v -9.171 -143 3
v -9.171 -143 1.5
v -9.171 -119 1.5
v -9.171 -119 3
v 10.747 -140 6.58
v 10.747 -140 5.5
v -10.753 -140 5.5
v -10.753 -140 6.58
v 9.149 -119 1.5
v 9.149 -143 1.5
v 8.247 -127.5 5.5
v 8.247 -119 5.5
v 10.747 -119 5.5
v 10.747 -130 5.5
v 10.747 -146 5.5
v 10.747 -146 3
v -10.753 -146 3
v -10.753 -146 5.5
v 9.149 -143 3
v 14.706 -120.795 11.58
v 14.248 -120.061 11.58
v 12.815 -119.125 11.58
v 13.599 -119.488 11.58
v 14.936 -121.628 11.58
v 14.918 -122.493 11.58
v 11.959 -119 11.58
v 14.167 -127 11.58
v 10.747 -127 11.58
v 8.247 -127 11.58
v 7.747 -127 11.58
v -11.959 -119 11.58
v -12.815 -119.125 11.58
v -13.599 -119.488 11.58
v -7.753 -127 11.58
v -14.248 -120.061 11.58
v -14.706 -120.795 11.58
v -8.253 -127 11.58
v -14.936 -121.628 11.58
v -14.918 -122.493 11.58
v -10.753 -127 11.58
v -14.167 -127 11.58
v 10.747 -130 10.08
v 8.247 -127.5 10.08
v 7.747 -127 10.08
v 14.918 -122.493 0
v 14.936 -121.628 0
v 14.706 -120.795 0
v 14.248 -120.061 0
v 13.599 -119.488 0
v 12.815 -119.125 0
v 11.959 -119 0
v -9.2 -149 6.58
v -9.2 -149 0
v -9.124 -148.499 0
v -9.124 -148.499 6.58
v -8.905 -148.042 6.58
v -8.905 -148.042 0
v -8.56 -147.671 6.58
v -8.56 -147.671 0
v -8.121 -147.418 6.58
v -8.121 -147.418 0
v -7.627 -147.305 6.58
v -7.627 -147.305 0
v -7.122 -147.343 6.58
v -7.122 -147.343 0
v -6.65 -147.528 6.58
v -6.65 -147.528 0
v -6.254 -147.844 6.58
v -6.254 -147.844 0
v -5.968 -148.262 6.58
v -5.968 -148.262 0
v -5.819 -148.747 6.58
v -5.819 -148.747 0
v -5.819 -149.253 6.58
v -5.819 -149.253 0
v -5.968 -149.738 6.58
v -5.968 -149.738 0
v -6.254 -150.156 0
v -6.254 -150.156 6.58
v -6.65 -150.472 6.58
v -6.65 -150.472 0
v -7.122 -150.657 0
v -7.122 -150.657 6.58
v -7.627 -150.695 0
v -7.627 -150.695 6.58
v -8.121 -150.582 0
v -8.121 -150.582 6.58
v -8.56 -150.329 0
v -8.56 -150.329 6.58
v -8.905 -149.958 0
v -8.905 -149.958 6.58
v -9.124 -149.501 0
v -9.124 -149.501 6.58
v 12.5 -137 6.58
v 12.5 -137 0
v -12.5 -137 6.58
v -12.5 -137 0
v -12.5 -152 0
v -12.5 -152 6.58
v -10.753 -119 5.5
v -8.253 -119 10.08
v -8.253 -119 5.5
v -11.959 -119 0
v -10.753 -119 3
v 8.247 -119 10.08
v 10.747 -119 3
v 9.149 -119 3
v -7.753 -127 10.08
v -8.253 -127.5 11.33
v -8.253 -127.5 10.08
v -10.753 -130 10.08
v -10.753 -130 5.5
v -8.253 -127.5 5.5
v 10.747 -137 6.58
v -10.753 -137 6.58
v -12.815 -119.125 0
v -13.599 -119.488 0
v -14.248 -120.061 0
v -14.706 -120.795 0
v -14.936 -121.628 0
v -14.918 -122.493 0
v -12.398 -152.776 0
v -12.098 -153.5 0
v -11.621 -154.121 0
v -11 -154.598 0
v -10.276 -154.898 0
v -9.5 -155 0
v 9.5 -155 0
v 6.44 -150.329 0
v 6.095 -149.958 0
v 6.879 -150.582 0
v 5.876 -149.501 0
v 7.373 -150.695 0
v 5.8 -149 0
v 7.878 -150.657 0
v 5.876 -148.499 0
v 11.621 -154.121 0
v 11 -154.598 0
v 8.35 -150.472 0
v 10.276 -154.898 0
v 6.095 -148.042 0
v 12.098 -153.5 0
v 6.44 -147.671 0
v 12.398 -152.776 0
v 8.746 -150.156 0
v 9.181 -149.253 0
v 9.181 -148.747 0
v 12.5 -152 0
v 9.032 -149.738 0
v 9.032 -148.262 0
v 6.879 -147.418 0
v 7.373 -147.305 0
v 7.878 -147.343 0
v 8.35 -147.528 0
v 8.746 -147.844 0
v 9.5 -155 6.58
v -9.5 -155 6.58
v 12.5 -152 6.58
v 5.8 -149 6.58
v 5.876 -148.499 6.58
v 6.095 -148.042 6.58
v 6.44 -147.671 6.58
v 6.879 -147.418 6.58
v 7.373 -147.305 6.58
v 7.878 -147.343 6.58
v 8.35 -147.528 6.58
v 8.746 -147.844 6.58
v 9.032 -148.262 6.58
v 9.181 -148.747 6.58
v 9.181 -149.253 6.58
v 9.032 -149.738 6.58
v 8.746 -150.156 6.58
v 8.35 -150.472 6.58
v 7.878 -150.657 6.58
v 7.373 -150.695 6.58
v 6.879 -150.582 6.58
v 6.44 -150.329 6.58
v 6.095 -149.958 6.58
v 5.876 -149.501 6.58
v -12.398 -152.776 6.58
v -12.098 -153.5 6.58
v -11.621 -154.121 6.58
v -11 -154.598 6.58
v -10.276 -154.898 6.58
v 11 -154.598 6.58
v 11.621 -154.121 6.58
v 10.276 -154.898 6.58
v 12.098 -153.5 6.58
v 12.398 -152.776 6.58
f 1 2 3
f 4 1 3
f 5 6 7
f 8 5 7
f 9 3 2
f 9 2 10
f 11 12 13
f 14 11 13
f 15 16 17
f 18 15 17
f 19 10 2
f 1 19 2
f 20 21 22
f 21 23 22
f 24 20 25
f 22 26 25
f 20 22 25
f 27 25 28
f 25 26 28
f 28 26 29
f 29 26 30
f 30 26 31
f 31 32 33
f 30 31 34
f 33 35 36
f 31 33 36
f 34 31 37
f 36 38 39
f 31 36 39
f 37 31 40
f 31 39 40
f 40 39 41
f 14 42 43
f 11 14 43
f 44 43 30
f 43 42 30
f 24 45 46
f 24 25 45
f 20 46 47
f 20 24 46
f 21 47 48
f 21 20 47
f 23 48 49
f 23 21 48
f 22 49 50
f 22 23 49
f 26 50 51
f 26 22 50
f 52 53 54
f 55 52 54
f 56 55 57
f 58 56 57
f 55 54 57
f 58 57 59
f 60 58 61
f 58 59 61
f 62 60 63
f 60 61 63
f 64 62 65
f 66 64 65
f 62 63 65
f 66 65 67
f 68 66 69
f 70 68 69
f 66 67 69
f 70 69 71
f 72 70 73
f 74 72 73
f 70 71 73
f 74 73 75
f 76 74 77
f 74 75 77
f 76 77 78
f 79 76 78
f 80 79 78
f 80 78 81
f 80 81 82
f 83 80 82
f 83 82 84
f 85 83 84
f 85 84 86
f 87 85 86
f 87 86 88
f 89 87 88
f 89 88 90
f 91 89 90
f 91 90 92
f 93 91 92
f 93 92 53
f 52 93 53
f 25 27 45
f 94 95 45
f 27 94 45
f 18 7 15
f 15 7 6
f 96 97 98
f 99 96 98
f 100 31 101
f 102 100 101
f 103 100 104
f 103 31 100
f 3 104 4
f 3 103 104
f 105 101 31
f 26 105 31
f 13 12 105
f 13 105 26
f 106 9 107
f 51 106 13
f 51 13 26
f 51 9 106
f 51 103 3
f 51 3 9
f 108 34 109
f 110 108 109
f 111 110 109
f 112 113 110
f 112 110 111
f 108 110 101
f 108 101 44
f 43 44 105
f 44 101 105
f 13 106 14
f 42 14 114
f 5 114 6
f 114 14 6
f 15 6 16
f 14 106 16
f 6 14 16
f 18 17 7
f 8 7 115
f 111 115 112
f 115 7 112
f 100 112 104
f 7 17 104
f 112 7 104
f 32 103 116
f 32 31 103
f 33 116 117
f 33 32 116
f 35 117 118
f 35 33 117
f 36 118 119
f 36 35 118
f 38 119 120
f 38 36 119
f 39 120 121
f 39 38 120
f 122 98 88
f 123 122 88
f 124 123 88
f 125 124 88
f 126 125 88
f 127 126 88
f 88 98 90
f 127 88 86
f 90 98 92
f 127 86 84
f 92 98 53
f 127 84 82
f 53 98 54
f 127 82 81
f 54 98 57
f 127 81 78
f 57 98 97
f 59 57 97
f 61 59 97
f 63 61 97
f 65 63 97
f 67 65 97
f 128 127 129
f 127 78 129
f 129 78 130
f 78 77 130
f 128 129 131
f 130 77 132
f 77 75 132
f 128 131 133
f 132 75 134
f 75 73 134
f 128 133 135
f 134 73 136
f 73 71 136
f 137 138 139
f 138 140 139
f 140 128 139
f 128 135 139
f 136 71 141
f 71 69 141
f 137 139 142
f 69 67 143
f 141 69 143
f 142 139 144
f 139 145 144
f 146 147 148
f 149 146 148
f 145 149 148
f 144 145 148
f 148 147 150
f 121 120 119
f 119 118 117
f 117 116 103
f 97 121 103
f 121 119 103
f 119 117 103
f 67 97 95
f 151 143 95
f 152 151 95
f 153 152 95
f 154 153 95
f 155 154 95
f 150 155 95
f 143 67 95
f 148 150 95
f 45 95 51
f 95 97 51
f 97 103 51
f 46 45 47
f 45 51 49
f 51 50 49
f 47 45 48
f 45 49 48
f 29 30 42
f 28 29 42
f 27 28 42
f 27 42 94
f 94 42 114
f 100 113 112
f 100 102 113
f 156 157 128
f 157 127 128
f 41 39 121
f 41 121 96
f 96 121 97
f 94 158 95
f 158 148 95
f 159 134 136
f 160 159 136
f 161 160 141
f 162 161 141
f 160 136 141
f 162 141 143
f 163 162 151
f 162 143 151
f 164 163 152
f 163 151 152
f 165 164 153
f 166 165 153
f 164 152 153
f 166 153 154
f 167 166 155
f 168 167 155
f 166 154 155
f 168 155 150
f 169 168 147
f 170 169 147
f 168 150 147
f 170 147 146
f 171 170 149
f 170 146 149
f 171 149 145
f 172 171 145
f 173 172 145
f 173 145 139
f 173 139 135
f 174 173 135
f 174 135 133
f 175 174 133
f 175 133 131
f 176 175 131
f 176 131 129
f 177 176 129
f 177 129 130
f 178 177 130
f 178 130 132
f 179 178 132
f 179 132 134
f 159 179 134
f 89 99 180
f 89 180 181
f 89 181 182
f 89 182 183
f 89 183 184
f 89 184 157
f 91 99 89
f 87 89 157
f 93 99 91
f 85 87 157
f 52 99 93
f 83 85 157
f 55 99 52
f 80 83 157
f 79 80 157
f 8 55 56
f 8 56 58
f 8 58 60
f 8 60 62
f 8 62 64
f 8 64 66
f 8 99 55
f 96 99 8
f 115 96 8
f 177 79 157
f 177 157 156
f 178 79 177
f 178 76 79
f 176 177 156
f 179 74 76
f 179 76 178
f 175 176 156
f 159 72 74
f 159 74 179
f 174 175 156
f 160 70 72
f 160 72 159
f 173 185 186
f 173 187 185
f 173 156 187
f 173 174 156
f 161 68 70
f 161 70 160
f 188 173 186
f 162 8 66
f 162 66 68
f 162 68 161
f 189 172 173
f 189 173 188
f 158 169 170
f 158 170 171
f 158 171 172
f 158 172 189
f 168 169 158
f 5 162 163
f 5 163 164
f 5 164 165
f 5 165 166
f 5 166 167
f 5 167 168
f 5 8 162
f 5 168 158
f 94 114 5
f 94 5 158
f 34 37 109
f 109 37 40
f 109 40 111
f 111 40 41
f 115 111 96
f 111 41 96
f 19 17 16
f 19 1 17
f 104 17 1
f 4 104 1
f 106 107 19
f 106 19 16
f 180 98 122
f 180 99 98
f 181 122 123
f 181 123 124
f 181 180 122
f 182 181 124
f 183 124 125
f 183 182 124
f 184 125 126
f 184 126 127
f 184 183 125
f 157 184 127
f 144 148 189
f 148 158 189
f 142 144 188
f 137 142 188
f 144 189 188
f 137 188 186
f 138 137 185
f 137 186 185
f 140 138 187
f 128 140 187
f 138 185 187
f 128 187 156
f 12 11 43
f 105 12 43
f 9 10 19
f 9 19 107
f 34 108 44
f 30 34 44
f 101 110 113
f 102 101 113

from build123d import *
from OCP.BRepFilletAPI import BRepFilletAPI_MakeChamfer

# Parameters (mm, degrees)
ESQUISSE2_W             = 25
ESQUISSE2_H             = 36
BOSS_EXTRU_1_DEPTH      = 1.5
ESQUISSE3_W             = 3.350614404
ESQUISSE3_H             = 24
ESQUISSE3_W_2           = 3.329385596
BOSS_EXTRU_2_DEPTH      = 1.5
BOSS_EXTRU_3_DEPTH      = 8.58
BOSS_EXTRU_3_DEPTH_BACK = 3
BOSS_EXTRU_4_START      = 2.5
ESQUISSE5_W             = 18.32
ESQUISSE5_H             = 3
BOSS_EXTRU_4_DEPTH      = 6.08
ESQUISSE6_W             = 16.5
ESQUISSE6_H             = 1.5
BOSS_EXTRU_5_DEPTH      = 8
ESQUISSE7_W             = 25
ESQUISSE7_H             = 18
ENL_V_MAT_EXTRU_1_DEPTH = 5
CHANFREIN1_SIZE         = 10
CHANFREIN1_SIZE_2       = 5
CHANFREIN3_SIZE         = 3
CONG_1_R                = 3
CONG_2_R                = 3
D_GAGEMENT_M31_D        = 3.4


# Some blends are built 0.0001 mm under size
with BuildPart() as part:
    # Esquisse2 → Boss.-Extru.1 (new body)
    with BuildSketch(Plane.XY):
        with Locations((0, -137)):
            Rectangle(ESQUISSE2_W, ESQUISSE2_H)
    extrude(amount=BOSS_EXTRU_1_DEPTH)

    # Esquisse3 → Boss.-Extru.2 (add)
    with BuildSketch(Plane.XY.offset(1.5)):
        with Locations((10.824692798, -131)):
            Rectangle(ESQUISSE3_W, ESQUISSE3_H)
        Polygon((-12.5, -143), (-12.5, -155), (12.5, -155), (12.5, -143), (9.149385596, -143), (-9.170614404, -143), align=None)
        with Locations((-10.835307202, -131)):
            Rectangle(ESQUISSE3_W_2, ESQUISSE3_H)
    extrude(amount=BOSS_EXTRU_2_DEPTH)

    # Esquisse4 → Boss.-Extru.3 (add, two sides: drawn at the far end of the back side and taken through both)
    with BuildSketch(Plane.XY.offset(3).offset(-BOSS_EXTRU_3_DEPTH_BACK)):
        Polygon((-12.5, -119), (-15.5, -119), (-12.5, -137), (-12.5, -155), (12.5, -155), (12.5, -137), (15.5, -119), (12.5, -119), (10.747346399, -119), (10.747346399, -146), (-10.752653601, -146), (-10.752653601, -119), align=None)
    extrude(amount=BOSS_EXTRU_3_DEPTH + BOSS_EXTRU_3_DEPTH_BACK)

    # Esquisse5 → Boss.-Extru.4 (add)
    with BuildSketch(Plane.XY.offset(3).offset(BOSS_EXTRU_4_START)):
        Polygon((-10.752653601, -140), (-10.752653601, -146), (10.747346399, -146), (10.747346399, -140), (9.149385596, -140), (9.149385596, -143), (-9.170614404, -143), (-9.170614404, -140), align=None)
        with Locations((-0.010614404, -141.5)):
            Rectangle(ESQUISSE5_W, ESQUISSE5_H)
    extrude(amount=BOSS_EXTRU_4_DEPTH)

    # Esquisse6 → Boss.-Extru.5 (add)
    with BuildSketch(Plane(origin=(0, -119, 0), x_dir=(1, 0, 0), z_dir=(0, 1, 0))):
        Polygon((8.247346399, -11.58), (10.747346399, -11.58), (10.747346399, -5.5), (8.247346399, -5.5), (8.247346399, -10.08), align=None)
        with Locations((-0.002653601, -10.83)):
            Rectangle(ESQUISSE6_W, ESQUISSE6_H)
        Polygon((-10.752653601, -11.58), (-8.252653601, -11.58), (-8.252653601, -10.08), (-8.252653601, -5.5), (-10.752653601, -5.5), align=None)
    extrude(amount=-BOSS_EXTRU_5_DEPTH)

    # Esquisse7 → Enlèv. mat.-Extru.1 (cut)
    with BuildSketch(Plane.XY.offset(11.58)):
        with Locations((0, -146)):
            Rectangle(ESQUISSE7_W, ESQUISSE7_H)
    extrude(amount=-ENL_V_MAT_EXTRU_1_DEPTH, mode=Mode.SUBTRACT)

    # Chanfrein1
    chanfrein1_edges_1 = [part.edges().sort_by_distance(p)[0] for p in [
        (11.6236732, -137, 11.58),
    ]]
    chanfrein1_side_1 = [part.faces().sort_by_distance(p)[0] for p in [
        (11.6236732, -136.9, 11.58),
    ]]
    chanfrein1_edges_2 = [part.edges().sort_by_distance(p)[0] for p in [
        (-11.6263268, -137, 11.58),
    ]]
    chanfrein1_side_2 = [part.faces().sort_by_distance(p)[0] for p in [
        (-11.6263268, -136.9, 11.58),
    ]]
    chanfrein1 = BRepFilletAPI_MakeChamfer(part.part.solid().wrapped)
    for e in chanfrein1_edges_1:
        chanfrein1.Add(CHANFREIN1_SIZE - 0.0001, CHANFREIN1_SIZE_2 - 0.0001, e.wrapped, chanfrein1_side_1[0].wrapped)
    for e in chanfrein1_edges_2:
        chanfrein1.Add(CHANFREIN1_SIZE - 0.0001, CHANFREIN1_SIZE_2 - 0.0001, e.wrapped, chanfrein1_side_2[0].wrapped)
    add(Compound.cast(chanfrein1.Shape()), mode=Mode.REPLACE)  # a hair under: the kernel refuses the full size

    # Chanfrein3
    # the kernel refuses this chamfer: 3 mm, written as the material it adds along each edge
    with BuildSketch(Plane(origin=(-10.752653601, -127, 5.5), x_dir=(0.9996219169112968, 0.027495876610586775, 0), z_dir=(0, 0, 1))) as chanfrein3_piece_1_section:
        Polygon((CHANFREIN3_SIZE * 0.999621916911, -CHANFREIN3_SIZE * 0.0274958766106), (-CHANFREIN3_SIZE * 0.0274958766106, -CHANFREIN3_SIZE * 0.999621916911), (0, 0), align=None)
    chanfrein3_piece_1 = extrude(amount=6.08, mode=Mode.PRIVATE)
    chanfrein3_piece_1 = split(chanfrein3_piece_1, bisect_by=Plane(origin=(-8.784858651, -128.928894575, 10.615612357), z_dir=(0, 0.4472100177446834, -0.8944289798686087)), keep=Keep.TOP, mode=Mode.PRIVATE)
    chanfrein3_piece_1 = split(chanfrein3_piece_1, bisect_by=Plane(origin=(-8.252653601, -127.516102525, 7.79), z_dir=(-1, 0, 0)), keep=Keep.TOP, mode=Mode.PRIVATE)
    add(chanfrein3_piece_1)
    with BuildSketch(Plane(origin=(-10.752653601, -127, -2.215048964), x_dir=(0.9996219169112968, 0.027495876610586775, 0), z_dir=(0, 0, 1))) as chanfrein3_piece_2_section:
        Polygon((CHANFREIN3_SIZE * 0.999621916911, -CHANFREIN3_SIZE * 0.0274958766106), (-CHANFREIN3_SIZE * 0.0274958766106, -CHANFREIN3_SIZE * 0.999621916911), (0, 0), align=None)
    chanfrein3_piece_2 = extrude(amount=13.795048964, mode=Mode.PRIVATE)
    chanfrein3_piece_2 = split(chanfrein3_piece_2, bisect_by=Plane(origin=(-8.083536067, -127.445596899, 11.357253778), z_dir=(0, 0.4472100177446834, -0.8944289798686087)), keep=Keep.TOP, mode=Mode.PRIVATE)
    chanfrein3_piece_2 = split(chanfrein3_piece_2, bisect_by=Plane(origin=(-8.083536067, -127.161764932, 10.08), z_dir=(0, 0, 1)), keep=Keep.TOP, mode=Mode.PRIVATE)
    add(chanfrein3_piece_2)
    with BuildSketch(Plane(origin=(10.747346399, -127, 11.58), x_dir=(0.027495876610588044, -0.9996219169112968, 0), z_dir=(0, 0, -1))) as chanfrein3_piece_3_section:
        Polygon((CHANFREIN3_SIZE * 0.999621916911, CHANFREIN3_SIZE * 0.0274958766106), (-CHANFREIN3_SIZE * 0.0274958766106, CHANFREIN3_SIZE * 0.999621916911), (0, 0), align=None)
    chanfrein3_piece_3 = extrude(amount=6.08, mode=Mode.PRIVATE)
    chanfrein3_piece_3 = split(chanfrein3_piece_3, bisect_by=Plane(origin=(9.990097255, -128.087123339, 11.036493766), z_dir=(0, 0.4472100177446834, -0.8944289798686087)), keep=Keep.TOP, mode=Mode.PRIVATE)
    chanfrein3_piece_3 = split(chanfrein3_piece_3, bisect_by=Plane(origin=(8.247346399, -127.874570821, 10.61138448), z_dir=(1, 0, 0)), keep=Keep.TOP, mode=Mode.PRIVATE)
    add(chanfrein3_piece_3)
    with BuildSketch(Plane(origin=(10.747346399, -127, 11.58), x_dir=(0.027495876610588044, -0.9996219169112968, 0), z_dir=(0, 0, -1))) as chanfrein3_piece_4_section:
        Polygon((CHANFREIN3_SIZE * 0.999621916911, CHANFREIN3_SIZE * 0.0274958766106), (-CHANFREIN3_SIZE * 0.0274958766106, CHANFREIN3_SIZE * 0.999621916911), (0, 0), align=None)
    chanfrein3_piece_4 = extrude(amount=13.795048964, mode=Mode.PRIVATE)
    chanfrein3_piece_4 = split(chanfrein3_piece_4, bisect_by=Plane(origin=(8.078228865, -127.445596899, 11.357253778), z_dir=(0, 0.4472100177446834, -0.8944289798686087)), keep=Keep.TOP, mode=Mode.PRIVATE)
    chanfrein3_piece_4 = split(chanfrein3_piece_4, bisect_by=Plane(origin=(8.078228865, -127.161764932, 10.08), z_dir=(0, 0, 1)), keep=Keep.TOP, mode=Mode.PRIVATE)
    add(chanfrein3_piece_4)

    # Congé1
    cong_1_edges = [part.edges().sort_by_distance(p)[0] for p in [
        (-15.5, -119, 5.79),
        (15.5, -119, 5.79),
    ]]
    fillet(cong_1_edges, radius=CONG_1_R)

    # Congé2
    cong_2_edges = [part.edges().sort_by_distance(p)[0] for p in [
        (12.5, -155, 3.29),
        (-12.5, -155, 3.29),
    ]]
    fillet(cong_2_edges, radius=CONG_2_R)

    # Dégagement M31 (through all)
    with Locations(Plane.XY.offset(6.58)):
        with Locations((7.5, -149), (-7.5, -149)):
            Hole(D_GAGEMENT_M31_D / 2)


solid = part.part
